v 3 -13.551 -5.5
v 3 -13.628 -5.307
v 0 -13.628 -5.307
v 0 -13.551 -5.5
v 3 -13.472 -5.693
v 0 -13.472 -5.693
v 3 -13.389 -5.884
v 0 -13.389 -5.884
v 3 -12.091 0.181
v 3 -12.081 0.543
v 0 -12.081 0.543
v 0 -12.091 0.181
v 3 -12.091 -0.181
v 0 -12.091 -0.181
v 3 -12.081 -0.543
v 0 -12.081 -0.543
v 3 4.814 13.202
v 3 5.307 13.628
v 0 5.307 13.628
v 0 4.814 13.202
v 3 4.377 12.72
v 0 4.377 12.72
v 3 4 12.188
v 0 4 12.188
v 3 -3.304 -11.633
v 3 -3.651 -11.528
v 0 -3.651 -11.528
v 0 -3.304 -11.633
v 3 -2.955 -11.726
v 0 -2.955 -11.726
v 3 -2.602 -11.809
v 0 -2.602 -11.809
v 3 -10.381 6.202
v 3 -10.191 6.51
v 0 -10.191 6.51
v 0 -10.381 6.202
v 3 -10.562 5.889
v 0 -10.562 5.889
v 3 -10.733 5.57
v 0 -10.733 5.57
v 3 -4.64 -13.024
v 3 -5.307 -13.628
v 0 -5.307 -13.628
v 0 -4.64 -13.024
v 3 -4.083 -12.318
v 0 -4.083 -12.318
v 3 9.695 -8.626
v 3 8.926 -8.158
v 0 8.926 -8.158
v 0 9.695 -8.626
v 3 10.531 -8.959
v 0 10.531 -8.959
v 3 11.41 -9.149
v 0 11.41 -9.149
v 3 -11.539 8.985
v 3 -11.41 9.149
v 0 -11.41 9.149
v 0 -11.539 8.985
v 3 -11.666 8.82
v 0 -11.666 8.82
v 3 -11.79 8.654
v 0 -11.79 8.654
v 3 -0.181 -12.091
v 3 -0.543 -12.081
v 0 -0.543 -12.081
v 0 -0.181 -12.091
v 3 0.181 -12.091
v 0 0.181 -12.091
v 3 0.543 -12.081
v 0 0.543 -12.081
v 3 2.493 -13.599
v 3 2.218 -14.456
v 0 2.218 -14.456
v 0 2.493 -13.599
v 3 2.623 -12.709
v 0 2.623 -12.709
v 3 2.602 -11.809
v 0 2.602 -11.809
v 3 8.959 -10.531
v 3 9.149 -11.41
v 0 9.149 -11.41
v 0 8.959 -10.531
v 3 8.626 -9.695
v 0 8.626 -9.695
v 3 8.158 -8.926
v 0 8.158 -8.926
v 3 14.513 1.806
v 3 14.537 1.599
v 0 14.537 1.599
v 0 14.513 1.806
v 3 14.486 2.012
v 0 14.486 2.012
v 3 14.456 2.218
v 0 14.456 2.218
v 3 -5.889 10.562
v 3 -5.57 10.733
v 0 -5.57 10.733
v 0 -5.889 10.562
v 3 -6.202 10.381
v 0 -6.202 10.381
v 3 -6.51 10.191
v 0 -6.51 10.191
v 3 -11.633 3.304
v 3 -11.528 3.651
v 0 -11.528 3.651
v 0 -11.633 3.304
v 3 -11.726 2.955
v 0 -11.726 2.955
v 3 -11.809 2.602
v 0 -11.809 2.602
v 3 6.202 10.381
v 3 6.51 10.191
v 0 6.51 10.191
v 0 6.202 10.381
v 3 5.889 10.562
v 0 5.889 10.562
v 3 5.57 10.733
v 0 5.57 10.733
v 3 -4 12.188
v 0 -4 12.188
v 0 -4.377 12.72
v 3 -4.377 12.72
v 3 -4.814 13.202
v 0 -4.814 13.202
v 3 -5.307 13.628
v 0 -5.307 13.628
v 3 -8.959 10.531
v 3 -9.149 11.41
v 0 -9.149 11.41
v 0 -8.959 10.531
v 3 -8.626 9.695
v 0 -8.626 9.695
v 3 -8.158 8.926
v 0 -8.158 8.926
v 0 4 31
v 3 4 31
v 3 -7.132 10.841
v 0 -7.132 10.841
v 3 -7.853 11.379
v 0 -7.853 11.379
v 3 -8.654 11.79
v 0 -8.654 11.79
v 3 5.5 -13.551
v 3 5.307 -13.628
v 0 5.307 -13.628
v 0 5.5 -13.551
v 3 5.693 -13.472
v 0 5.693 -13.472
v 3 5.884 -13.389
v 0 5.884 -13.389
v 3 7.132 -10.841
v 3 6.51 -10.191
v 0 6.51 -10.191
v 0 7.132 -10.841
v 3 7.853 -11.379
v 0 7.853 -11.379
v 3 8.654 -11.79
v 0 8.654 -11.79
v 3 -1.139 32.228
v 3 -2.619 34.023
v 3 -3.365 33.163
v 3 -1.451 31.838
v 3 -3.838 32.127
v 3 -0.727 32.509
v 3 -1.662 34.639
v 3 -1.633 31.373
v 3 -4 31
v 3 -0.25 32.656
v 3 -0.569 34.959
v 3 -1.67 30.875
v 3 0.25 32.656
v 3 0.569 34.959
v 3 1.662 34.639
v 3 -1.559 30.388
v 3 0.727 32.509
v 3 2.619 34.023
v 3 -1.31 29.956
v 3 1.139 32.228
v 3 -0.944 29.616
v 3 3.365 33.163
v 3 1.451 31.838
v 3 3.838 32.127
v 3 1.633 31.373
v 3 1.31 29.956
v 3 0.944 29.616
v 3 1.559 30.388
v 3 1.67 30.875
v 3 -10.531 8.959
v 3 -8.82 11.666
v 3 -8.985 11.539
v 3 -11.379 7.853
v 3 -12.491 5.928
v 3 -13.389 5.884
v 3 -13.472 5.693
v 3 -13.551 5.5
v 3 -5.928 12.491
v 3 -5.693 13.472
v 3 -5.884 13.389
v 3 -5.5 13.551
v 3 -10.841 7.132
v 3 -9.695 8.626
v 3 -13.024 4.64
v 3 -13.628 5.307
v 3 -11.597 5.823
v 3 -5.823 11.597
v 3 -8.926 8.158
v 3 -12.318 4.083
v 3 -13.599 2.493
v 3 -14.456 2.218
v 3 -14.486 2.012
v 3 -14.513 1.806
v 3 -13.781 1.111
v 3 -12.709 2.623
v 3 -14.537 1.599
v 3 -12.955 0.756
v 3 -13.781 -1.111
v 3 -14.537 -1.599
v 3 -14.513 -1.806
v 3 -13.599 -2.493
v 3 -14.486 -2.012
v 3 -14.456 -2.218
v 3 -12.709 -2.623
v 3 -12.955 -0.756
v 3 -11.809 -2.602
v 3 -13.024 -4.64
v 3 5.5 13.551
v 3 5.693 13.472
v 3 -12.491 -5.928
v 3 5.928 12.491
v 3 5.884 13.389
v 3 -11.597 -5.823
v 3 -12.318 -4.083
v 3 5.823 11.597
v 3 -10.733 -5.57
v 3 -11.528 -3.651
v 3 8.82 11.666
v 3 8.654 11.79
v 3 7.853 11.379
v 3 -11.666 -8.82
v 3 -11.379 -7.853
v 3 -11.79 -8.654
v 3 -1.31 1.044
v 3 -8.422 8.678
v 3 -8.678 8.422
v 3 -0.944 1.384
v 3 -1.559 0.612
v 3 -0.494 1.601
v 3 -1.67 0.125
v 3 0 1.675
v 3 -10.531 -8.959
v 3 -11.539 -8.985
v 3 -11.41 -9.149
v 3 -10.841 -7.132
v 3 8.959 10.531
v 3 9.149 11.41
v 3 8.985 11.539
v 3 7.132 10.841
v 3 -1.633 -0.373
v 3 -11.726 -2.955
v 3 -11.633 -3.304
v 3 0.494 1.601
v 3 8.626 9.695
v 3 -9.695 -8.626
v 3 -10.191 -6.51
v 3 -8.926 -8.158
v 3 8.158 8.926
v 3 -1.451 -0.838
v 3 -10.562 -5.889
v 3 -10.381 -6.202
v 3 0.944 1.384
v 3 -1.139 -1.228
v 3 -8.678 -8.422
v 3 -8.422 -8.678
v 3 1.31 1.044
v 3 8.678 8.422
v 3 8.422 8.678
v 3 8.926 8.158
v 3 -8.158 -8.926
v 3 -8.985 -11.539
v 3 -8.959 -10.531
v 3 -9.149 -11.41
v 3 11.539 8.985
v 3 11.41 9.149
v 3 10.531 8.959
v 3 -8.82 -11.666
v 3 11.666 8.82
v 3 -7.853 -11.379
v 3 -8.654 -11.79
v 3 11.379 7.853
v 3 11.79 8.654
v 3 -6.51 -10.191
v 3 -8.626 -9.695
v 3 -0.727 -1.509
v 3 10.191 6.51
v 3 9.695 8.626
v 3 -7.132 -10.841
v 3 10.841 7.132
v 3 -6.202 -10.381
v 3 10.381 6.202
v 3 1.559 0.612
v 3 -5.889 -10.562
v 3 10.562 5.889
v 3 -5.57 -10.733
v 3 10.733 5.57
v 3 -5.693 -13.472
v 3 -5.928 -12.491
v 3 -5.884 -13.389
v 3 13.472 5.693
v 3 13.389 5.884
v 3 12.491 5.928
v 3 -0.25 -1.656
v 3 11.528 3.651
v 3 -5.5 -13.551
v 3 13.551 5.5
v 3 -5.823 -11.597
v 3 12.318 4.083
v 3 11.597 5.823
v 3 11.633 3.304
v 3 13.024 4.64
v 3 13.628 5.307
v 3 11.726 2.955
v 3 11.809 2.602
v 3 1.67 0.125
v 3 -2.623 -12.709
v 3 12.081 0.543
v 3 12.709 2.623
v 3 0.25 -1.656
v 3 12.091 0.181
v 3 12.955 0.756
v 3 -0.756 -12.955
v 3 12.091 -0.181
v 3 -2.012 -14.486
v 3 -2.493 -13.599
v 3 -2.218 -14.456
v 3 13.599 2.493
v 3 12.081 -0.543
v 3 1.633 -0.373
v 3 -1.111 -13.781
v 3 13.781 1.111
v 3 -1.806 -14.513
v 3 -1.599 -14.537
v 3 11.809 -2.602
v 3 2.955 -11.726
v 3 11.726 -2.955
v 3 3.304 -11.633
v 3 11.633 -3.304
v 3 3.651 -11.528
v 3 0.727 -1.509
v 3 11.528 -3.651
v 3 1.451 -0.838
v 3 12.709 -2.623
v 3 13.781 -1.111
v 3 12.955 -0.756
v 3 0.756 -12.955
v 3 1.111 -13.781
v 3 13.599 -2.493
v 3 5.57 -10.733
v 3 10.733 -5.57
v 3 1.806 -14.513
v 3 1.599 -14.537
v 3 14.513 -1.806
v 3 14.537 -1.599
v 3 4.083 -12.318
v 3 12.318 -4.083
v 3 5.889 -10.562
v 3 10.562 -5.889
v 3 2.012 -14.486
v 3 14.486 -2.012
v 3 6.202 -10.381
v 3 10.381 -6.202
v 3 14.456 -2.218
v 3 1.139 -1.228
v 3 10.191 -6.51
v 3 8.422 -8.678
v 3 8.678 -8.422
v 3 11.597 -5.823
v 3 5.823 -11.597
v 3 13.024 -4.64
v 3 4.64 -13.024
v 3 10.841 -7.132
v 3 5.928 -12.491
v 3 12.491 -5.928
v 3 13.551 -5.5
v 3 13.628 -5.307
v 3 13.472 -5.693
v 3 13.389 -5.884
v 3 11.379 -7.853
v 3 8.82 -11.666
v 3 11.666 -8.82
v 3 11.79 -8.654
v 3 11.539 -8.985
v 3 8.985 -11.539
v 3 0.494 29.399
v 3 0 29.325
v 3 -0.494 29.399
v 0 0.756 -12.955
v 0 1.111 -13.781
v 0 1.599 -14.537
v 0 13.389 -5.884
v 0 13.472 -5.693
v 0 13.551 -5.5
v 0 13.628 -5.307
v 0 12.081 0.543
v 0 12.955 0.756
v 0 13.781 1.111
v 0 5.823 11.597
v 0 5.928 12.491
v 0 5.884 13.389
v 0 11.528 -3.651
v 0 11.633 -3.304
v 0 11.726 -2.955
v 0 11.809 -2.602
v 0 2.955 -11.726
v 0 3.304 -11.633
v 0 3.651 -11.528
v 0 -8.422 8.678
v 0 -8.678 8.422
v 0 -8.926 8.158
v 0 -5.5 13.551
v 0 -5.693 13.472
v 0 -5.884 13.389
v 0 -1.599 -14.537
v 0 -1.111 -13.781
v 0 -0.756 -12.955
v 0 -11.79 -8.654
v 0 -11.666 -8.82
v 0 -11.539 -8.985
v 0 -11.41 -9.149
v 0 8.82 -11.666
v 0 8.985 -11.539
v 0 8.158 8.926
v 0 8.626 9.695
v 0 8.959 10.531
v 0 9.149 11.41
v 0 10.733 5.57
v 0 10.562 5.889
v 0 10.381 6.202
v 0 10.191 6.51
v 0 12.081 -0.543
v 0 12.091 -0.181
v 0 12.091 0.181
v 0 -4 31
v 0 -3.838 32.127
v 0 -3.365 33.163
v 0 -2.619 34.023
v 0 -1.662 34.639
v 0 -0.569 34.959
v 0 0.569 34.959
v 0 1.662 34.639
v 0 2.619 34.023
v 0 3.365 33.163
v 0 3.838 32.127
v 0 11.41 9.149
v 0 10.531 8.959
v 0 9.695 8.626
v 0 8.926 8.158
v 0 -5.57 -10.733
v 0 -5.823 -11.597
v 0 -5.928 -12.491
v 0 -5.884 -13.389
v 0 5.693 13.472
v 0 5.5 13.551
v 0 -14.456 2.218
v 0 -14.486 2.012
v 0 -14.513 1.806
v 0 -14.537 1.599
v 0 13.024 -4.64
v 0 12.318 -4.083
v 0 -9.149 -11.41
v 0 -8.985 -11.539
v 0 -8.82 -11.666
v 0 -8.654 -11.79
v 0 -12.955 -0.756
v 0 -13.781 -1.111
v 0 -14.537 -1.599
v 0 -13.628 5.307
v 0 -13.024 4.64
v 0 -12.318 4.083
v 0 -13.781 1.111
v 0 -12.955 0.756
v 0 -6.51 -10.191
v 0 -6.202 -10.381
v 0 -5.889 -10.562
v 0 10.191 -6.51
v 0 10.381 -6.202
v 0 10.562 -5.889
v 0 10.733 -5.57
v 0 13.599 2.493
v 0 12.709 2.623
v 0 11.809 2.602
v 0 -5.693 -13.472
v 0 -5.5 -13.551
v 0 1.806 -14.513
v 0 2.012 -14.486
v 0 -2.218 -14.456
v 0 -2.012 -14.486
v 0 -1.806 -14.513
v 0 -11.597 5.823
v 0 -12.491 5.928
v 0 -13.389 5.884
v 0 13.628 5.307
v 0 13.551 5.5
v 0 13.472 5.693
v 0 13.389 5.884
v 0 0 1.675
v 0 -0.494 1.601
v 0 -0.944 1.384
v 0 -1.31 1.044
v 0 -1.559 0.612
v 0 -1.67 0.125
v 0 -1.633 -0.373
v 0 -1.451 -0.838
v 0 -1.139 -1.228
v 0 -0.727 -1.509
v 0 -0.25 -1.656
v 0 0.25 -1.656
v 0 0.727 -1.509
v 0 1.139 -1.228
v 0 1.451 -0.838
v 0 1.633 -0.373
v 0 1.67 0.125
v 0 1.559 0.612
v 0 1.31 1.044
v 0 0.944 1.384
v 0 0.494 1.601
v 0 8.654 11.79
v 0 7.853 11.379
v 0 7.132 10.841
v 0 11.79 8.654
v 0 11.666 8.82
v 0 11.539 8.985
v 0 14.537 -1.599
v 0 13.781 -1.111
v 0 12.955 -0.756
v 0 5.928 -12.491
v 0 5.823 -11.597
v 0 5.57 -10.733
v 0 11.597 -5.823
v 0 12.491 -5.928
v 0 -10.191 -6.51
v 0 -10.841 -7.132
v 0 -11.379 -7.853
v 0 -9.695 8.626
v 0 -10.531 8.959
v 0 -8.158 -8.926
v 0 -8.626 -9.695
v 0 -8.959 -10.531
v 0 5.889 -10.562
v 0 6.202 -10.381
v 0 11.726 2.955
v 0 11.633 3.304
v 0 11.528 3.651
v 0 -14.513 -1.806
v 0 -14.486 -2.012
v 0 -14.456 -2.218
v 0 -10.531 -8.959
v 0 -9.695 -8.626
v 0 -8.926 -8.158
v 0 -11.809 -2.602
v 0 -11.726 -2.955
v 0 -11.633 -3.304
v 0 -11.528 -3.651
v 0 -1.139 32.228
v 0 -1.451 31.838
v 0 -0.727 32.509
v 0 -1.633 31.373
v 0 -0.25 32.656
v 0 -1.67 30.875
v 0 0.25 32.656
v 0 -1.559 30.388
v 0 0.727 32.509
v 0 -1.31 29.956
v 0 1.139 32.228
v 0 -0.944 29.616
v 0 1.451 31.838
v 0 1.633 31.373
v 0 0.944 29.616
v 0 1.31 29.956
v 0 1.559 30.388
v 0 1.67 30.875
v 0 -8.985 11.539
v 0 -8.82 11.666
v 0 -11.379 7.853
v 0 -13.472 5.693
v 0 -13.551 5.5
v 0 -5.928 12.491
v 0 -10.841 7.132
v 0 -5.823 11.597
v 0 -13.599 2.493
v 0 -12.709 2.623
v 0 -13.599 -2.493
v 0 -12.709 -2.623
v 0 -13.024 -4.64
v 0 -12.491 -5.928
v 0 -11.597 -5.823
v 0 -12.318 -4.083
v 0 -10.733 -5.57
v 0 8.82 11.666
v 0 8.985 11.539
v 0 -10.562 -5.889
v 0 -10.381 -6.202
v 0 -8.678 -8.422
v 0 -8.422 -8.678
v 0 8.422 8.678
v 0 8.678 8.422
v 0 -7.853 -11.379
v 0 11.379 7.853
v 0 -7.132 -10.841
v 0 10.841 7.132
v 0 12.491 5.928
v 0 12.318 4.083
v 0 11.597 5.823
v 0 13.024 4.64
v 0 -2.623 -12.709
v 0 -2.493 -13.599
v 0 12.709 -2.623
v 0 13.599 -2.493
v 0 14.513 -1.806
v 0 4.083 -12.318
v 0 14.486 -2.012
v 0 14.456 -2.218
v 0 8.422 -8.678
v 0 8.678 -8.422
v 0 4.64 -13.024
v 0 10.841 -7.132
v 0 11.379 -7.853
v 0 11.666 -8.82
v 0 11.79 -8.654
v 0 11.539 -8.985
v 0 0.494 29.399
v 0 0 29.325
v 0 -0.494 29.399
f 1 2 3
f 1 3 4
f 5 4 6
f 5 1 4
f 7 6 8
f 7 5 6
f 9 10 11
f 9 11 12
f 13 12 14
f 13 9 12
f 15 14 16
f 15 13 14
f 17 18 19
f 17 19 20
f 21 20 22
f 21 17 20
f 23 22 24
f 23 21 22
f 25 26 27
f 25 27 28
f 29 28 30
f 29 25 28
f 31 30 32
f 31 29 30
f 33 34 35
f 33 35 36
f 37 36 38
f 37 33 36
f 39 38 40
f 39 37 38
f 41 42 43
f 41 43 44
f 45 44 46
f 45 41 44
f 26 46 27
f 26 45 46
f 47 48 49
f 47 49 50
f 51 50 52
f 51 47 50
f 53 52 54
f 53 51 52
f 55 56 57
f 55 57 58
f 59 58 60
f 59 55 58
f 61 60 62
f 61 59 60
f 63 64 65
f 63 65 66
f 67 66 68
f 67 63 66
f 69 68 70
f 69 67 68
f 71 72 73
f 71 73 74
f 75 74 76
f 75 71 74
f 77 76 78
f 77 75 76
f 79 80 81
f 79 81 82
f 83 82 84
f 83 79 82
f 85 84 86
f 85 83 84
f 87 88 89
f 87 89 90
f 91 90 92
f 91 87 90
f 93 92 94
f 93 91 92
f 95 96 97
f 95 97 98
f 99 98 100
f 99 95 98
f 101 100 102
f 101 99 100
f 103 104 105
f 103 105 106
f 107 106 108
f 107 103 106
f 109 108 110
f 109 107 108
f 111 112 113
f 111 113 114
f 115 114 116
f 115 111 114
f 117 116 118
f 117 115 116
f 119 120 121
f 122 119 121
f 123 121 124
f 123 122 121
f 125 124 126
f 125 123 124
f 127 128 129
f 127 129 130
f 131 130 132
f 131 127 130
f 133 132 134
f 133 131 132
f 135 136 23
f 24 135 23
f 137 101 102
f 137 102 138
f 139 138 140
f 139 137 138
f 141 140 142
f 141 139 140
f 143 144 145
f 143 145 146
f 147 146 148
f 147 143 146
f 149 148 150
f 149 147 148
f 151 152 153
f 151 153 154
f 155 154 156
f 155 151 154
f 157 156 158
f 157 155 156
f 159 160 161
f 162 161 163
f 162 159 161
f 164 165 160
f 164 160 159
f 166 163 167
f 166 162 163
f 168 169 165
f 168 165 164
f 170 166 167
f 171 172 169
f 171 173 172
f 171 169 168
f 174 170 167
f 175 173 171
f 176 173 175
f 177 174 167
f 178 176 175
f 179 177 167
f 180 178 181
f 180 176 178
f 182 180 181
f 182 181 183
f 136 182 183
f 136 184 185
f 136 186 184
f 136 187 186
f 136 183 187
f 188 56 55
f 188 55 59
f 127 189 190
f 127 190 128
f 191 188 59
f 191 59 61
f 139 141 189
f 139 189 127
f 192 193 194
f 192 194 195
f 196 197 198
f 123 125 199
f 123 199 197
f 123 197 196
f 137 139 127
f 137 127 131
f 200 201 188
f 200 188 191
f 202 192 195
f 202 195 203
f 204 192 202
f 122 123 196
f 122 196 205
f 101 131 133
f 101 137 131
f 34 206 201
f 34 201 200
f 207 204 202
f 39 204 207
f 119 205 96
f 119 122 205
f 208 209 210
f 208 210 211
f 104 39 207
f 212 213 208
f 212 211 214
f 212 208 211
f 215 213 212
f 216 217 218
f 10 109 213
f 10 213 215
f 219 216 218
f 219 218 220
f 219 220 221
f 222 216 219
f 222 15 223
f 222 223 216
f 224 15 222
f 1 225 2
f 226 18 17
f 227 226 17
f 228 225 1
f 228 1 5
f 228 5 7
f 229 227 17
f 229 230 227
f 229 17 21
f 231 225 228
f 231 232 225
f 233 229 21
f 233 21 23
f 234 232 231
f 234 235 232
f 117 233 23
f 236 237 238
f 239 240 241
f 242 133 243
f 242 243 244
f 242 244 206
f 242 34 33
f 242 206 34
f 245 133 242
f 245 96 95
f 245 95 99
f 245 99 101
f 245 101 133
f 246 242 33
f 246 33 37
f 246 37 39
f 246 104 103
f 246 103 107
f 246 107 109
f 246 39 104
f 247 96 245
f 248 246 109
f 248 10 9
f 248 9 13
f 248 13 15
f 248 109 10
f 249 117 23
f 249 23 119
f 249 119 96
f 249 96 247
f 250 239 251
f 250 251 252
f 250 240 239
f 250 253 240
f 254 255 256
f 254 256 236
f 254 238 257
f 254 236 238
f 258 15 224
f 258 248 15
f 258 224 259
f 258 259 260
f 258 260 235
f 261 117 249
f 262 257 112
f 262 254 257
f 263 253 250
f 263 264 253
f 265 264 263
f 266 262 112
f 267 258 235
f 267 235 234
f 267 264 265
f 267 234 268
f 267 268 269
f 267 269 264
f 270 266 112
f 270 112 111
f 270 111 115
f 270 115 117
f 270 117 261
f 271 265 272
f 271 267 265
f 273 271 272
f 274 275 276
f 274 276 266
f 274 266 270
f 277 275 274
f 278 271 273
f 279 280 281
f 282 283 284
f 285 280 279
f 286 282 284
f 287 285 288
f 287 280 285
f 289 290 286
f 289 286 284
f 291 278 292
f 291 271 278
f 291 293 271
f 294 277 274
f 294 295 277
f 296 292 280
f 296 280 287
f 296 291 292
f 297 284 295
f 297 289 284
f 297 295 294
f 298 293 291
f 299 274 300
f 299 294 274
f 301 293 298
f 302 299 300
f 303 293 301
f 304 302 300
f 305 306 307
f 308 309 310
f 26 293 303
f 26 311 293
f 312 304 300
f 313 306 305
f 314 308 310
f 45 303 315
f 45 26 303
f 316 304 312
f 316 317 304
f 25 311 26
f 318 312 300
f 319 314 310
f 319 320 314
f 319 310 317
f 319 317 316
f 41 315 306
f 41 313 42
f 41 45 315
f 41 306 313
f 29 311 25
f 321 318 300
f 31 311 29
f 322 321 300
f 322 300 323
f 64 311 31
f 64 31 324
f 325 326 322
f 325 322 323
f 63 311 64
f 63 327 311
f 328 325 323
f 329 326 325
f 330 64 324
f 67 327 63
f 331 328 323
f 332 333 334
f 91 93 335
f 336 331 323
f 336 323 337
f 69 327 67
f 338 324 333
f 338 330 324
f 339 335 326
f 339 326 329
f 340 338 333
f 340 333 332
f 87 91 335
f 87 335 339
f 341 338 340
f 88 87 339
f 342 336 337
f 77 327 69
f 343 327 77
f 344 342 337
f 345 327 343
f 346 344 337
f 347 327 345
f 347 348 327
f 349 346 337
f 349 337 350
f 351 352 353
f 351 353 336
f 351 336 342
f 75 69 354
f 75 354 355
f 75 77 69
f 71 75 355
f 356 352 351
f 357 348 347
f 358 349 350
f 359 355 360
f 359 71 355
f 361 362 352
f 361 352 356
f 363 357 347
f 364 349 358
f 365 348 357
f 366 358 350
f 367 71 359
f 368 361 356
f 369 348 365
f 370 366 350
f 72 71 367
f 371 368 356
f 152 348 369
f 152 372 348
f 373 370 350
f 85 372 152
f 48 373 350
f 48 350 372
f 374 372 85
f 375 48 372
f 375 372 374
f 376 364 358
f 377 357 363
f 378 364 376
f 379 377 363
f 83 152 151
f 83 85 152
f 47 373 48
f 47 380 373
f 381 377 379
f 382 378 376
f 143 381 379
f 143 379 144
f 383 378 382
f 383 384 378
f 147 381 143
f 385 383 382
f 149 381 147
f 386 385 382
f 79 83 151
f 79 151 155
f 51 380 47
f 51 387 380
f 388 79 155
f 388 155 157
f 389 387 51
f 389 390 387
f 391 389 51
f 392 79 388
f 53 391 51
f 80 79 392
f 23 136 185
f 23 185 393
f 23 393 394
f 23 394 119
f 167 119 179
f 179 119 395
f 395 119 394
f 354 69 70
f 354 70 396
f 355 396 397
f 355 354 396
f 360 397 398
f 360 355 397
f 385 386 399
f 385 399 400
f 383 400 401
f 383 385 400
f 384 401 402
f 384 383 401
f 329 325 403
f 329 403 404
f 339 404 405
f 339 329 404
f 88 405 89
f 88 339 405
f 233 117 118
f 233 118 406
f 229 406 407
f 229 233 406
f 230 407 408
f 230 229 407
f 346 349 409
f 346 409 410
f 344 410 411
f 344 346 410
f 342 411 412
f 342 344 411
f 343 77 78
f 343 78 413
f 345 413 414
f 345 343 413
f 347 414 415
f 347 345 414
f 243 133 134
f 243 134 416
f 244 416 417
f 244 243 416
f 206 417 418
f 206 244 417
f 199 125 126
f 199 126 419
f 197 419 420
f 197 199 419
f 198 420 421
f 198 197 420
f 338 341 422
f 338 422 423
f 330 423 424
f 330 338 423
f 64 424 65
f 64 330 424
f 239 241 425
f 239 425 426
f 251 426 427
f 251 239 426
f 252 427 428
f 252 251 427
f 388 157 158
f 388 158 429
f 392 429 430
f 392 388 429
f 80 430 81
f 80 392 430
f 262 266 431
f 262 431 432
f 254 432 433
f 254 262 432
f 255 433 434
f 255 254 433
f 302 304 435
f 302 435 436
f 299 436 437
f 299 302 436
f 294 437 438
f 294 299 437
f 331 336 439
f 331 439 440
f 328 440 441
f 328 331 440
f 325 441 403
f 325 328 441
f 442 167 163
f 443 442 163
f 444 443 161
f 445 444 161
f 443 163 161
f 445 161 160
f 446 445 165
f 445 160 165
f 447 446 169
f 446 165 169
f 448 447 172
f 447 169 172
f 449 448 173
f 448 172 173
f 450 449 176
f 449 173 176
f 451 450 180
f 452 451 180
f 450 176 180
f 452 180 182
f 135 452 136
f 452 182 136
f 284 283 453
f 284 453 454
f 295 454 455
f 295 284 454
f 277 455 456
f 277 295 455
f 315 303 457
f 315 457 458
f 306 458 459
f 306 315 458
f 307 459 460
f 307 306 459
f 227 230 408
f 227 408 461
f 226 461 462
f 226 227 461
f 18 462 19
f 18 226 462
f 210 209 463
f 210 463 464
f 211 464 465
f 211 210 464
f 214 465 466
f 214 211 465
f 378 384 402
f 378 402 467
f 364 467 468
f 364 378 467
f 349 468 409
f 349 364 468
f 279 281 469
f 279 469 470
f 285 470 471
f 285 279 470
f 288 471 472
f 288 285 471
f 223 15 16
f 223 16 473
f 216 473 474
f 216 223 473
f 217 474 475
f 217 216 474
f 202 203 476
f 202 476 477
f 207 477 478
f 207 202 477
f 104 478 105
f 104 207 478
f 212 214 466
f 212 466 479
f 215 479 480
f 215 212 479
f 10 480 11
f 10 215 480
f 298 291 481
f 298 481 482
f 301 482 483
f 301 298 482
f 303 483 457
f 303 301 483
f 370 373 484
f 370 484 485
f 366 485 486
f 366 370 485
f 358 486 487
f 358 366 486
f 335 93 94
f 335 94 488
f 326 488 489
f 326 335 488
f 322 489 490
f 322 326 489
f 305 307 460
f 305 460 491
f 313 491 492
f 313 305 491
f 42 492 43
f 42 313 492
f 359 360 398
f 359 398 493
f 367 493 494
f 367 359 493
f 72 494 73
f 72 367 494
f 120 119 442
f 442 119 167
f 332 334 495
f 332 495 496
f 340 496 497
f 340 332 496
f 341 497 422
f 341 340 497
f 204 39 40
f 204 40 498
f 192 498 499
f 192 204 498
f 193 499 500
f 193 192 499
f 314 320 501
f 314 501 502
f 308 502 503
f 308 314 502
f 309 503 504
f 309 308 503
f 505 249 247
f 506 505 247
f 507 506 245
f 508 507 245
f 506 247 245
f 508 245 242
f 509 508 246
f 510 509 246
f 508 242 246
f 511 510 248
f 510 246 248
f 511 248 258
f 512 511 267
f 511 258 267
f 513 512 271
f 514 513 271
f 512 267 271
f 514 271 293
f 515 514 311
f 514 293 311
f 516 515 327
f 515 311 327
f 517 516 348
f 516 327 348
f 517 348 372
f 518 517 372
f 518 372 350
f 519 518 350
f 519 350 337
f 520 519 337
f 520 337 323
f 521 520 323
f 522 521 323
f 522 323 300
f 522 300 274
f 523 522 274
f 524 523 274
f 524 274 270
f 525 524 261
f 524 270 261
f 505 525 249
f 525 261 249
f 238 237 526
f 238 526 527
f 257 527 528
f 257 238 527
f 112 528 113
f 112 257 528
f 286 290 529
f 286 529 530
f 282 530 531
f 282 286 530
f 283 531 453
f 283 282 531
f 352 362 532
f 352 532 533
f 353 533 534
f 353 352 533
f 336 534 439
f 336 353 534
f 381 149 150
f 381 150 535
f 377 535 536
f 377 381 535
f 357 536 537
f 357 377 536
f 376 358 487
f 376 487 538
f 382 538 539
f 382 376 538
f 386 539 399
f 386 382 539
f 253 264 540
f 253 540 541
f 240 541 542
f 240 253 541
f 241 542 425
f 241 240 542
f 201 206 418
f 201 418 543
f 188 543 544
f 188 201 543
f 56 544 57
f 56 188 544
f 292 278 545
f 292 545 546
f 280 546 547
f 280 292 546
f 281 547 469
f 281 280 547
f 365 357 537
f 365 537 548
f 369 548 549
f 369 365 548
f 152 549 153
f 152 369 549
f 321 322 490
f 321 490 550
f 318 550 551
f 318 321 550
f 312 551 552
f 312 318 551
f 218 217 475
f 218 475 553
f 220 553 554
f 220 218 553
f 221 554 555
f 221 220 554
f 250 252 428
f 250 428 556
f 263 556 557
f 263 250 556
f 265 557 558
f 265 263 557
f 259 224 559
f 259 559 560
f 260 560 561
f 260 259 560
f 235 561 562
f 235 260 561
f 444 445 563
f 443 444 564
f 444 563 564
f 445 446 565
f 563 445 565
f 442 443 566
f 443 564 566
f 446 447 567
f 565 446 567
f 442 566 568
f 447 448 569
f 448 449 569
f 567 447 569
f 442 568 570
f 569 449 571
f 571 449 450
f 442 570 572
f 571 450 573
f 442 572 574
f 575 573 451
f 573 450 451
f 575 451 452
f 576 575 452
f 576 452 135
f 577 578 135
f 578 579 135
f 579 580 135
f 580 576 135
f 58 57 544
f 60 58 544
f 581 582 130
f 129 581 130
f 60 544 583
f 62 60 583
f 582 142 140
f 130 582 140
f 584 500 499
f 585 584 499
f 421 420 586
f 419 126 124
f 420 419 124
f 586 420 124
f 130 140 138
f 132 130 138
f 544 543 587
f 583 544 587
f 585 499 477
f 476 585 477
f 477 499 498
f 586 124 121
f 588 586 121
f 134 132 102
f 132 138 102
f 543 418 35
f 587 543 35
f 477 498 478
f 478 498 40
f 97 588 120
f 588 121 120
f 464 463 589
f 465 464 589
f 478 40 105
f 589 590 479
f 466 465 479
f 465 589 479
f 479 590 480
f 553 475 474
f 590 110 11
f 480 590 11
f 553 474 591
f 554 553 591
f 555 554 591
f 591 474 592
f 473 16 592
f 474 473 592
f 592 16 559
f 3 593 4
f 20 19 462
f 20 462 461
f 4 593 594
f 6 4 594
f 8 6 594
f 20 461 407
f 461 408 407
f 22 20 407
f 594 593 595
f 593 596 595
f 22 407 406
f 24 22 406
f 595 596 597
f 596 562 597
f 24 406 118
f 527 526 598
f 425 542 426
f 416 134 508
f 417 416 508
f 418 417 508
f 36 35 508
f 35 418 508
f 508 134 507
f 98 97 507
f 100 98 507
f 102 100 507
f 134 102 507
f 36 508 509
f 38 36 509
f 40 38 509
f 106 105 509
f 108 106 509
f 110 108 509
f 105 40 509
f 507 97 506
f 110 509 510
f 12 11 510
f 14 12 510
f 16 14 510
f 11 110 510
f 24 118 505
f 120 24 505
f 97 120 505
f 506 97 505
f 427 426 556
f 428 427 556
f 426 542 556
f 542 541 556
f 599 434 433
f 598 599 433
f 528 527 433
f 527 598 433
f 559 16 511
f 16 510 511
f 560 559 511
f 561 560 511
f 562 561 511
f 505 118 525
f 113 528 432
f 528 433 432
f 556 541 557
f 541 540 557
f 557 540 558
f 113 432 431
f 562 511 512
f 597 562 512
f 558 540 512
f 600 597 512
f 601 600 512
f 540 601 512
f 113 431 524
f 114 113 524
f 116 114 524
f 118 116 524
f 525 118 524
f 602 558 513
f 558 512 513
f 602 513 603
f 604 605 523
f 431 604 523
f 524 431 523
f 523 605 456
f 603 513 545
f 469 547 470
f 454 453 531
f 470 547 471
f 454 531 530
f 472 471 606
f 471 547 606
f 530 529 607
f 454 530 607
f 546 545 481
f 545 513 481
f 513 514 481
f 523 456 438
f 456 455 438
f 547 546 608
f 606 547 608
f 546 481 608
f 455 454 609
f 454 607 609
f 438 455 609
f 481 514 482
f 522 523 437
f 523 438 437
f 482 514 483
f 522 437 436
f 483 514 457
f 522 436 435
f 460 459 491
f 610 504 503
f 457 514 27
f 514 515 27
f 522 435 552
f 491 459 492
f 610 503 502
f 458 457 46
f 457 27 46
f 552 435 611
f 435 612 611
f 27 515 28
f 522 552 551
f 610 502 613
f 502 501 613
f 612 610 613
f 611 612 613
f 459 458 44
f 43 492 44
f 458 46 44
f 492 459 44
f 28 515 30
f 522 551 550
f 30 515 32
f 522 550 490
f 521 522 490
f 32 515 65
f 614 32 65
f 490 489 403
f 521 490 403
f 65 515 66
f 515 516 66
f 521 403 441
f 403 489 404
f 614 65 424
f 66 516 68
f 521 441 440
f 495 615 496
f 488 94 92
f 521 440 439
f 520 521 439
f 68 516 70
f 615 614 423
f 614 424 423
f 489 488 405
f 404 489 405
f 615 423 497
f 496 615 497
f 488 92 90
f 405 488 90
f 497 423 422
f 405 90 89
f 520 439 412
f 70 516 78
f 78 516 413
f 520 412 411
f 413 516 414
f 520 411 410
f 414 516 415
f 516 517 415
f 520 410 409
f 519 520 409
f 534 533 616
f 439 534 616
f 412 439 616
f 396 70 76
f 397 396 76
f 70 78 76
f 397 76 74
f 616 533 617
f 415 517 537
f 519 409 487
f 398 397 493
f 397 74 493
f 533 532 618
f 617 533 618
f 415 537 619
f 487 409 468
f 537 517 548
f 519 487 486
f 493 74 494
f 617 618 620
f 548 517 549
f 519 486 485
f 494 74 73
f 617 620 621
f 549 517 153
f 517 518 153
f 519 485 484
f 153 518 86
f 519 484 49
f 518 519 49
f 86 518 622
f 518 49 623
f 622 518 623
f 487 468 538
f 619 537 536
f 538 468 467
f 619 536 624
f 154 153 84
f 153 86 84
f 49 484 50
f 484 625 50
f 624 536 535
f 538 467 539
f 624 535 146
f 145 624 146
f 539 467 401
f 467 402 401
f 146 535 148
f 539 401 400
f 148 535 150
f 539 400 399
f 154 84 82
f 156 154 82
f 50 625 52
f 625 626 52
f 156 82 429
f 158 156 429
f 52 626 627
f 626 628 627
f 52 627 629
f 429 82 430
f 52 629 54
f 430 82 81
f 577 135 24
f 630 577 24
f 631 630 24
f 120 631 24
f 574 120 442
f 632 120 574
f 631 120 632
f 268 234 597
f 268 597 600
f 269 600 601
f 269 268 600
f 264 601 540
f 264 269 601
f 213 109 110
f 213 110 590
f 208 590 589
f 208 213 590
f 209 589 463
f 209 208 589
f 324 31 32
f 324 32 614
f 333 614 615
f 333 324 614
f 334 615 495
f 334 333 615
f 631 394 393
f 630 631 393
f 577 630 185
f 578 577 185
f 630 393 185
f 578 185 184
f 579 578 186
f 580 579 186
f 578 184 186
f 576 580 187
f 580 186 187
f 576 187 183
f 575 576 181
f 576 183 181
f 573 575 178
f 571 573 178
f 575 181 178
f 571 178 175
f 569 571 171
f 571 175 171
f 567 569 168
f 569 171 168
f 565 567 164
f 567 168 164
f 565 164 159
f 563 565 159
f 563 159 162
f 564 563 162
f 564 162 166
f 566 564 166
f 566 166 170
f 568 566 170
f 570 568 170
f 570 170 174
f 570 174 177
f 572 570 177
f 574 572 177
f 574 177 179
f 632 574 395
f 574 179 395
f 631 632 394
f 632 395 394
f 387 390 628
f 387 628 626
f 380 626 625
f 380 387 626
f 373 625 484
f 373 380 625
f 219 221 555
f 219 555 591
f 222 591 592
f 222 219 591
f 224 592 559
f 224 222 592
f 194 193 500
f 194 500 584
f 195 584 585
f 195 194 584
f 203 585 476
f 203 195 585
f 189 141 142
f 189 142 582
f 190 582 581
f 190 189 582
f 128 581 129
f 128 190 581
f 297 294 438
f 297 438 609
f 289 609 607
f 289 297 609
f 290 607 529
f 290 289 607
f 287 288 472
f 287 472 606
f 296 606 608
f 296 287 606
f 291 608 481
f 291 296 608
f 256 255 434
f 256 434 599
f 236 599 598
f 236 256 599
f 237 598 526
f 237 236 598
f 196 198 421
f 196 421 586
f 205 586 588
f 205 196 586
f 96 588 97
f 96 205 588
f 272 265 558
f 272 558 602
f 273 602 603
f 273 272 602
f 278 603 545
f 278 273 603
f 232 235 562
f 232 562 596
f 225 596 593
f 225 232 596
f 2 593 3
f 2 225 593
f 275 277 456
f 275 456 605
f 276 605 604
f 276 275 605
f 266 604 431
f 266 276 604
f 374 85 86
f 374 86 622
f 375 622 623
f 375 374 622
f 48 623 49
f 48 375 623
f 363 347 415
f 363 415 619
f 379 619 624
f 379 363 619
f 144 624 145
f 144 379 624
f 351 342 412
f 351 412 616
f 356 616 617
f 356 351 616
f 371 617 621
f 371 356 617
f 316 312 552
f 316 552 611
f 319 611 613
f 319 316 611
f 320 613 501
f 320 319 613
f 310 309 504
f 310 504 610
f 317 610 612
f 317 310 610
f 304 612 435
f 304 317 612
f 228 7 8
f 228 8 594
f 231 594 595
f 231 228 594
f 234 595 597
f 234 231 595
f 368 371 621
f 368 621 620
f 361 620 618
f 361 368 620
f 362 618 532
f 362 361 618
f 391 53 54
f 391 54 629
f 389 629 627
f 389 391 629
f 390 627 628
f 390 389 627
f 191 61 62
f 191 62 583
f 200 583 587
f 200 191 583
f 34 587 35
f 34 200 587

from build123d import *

# Parameters (mm, degrees)
SKETCH1_R           = 1.675
BOSS_EXTRUDE1_DEPTH = 3
SKETCH2_R           = 1.675
BOSS_EXTRUDE2_DEPTH = 3


with BuildPart() as part:
    # Sketch1 → Boss-Extrude1 (new body)
    with BuildSketch(Plane(origin=(3, 0, 0), x_dir=(0, 0, -1), z_dir=(1, 0, 0))):
        with BuildLine():
            ThreePointArc((-14.537314892, 1.599093719), (-13.375367565, 0.916420874), (-12.080565177, 0.542722358))
            ThreePointArc((-12.080565177, 0.542722358), (-12.09275, 0), (-12.080565177, -0.542722358))
            ThreePointArc((-12.080565177, -0.542722358), (-13.375367565, -0.916420874), (-14.537314892, -1.599093719))
            ThreePointArc((-14.537314892, -1.599093719), (-14.499881098, -1.908945561), (-14.455843809, -2.217928037))
            ThreePointArc((-14.455843809, -2.217928037), (-13.156800143, -2.576605271), (-11.809396783, -2.602450802))
            ThreePointArc((-11.809396783, -2.602450802), (-11.680699536, -3.129834008), (-11.528463019, -3.650909885))
            ThreePointArc((-11.528463019, -3.650909885), (-12.682425791, -4.346994451), (-13.62809199, -5.30713988))
            ThreePointArc((-13.62809199, -5.30713988), (-13.511738163, -5.596745198), (-13.389230859, -5.883801663))
            ThreePointArc((-13.389230859, -5.883801663), (-12.041618533, -5.894040025), (-10.733437515, -5.57027124))
            ThreePointArc((-10.733437515, -5.57027124), (-10.472628702, -6.046375), (-10.190715157, -6.510293938))
            ThreePointArc((-10.190715157, -6.510293938), (-11.125197659, -7.48132754), (-11.79013714, -8.65351323))
            ThreePointArc((-11.79013714, -8.65351323), (-11.602792602, -8.903135899), (-11.410163953, -9.148703928))
            ThreePointArc((-11.410163953, -9.148703928), (-10.105820521, -8.809805691), (-8.926012217, -8.158486898))
            ThreePointArc((-8.926012217, -8.158486898), (-8.550865528, -8.550865528), (-8.158486898, -8.926012217))
            ThreePointArc((-8.158486898, -8.926012217), (-8.809805691, -10.105820521), (-9.148703928, -11.410163953))
            ThreePointArc((-9.148703928, -11.410163953), (-8.903135899, -11.602792602), (-8.65351323, -11.79013714))
            ThreePointArc((-8.65351323, -11.79013714), (-7.48132754, -11.125197659), (-6.510293938, -10.190715157))
            ThreePointArc((-6.510293938, -10.190715157), (-6.046375, -10.472628702), (-5.57027124, -10.733437515))
            ThreePointArc((-5.57027124, -10.733437515), (-5.894040025, -12.041618533), (-5.883801663, -13.389230859))
            ThreePointArc((-5.883801663, -13.389230859), (-5.596745198, -13.511738163), (-5.30713988, -13.62809199))
            ThreePointArc((-5.30713988, -13.62809199), (-4.346994451, -12.682425791), (-3.650909885, -11.528463019))
            ThreePointArc((-3.650909885, -11.528463019), (-3.129834008, -11.680699536), (-2.602450802, -11.809396783))
            ThreePointArc((-2.602450802, -11.809396783), (-2.576605271, -13.156800143), (-2.217928037, -14.455843809))
            ThreePointArc((-2.217928037, -14.455843809), (-1.908945561, -14.499881098), (-1.599093719, -14.537314892))
            ThreePointArc((-1.599093719, -14.537314892), (-0.916420874, -13.375367565), (-0.542722358, -12.080565177))
            ThreePointArc((-0.542722358, -12.080565177), (0, -12.09275), (0.542722358, -12.080565177))
            ThreePointArc((0.542722358, -12.080565177), (0.916420874, -13.375367565), (1.599093719, -14.537314892))
            ThreePointArc((1.599093719, -14.537314892), (1.908945561, -14.499881098), (2.217928037, -14.455843809))
            ThreePointArc((2.217928037, -14.455843809), (2.576605271, -13.156800143), (2.602450802, -11.809396783))
            ThreePointArc((2.602450802, -11.809396783), (3.129834008, -11.680699536), (3.650909885, -11.528463019))
            ThreePointArc((3.650909885, -11.528463019), (4.346994451, -12.682425791), (5.30713988, -13.62809199))
            ThreePointArc((5.30713988, -13.62809199), (5.596745198, -13.511738163), (5.883801663, -13.389230859))
            ThreePointArc((5.883801663, -13.389230859), (5.894040025, -12.041618533), (5.57027124, -10.733437515))
            ThreePointArc((5.57027124, -10.733437515), (6.046375, -10.472628702), (6.510293938, -10.190715157))
            ThreePointArc((6.510293938, -10.190715157), (7.48132754, -11.125197659), (8.65351323, -11.79013714))
            ThreePointArc((8.65351323, -11.79013714), (8.903135899, -11.602792602), (9.148703928, -11.410163953))
            ThreePointArc((9.148703928, -11.410163953), (8.809805691, -10.105820521), (8.158486898, -8.926012217))
            ThreePointArc((8.158486898, -8.926012217), (8.550865528, -8.550865528), (8.926012217, -8.158486898))
            ThreePointArc((8.926012217, -8.158486898), (10.105820521, -8.809805691), (11.410163953, -9.148703928))
            ThreePointArc((11.410163953, -9.148703928), (11.602792602, -8.903135899), (11.79013714, -8.65351323))
            ThreePointArc((11.79013714, -8.65351323), (11.125197659, -7.48132754), (10.190715157, -6.510293938))
            ThreePointArc((10.190715157, -6.510293938), (10.472628702, -6.046375), (10.733437515, -5.57027124))
            ThreePointArc((10.733437515, -5.57027124), (12.041618533, -5.894040025), (13.389230859, -5.883801663))
            ThreePointArc((13.389230859, -5.883801663), (13.511738163, -5.596745198), (13.62809199, -5.30713988))
            ThreePointArc((13.62809199, -5.30713988), (12.682425791, -4.346994451), (11.528463019, -3.650909885))
            ThreePointArc((11.528463019, -3.650909885), (11.680699536, -3.129834008), (11.809396783, -2.602450802))
            ThreePointArc((11.809396783, -2.602450802), (13.156800143, -2.576605271), (14.455843809, -2.217928037))
            ThreePointArc((14.455843809, -2.217928037), (14.499881098, -1.908945561), (14.537314892, -1.599093719))
            ThreePointArc((14.537314892, -1.599093719), (13.375367565, -0.916420874), (12.080565177, -0.542722358))
            ThreePointArc((12.080565177, -0.542722358), (12.09275, 0), (12.080565177, 0.542722358))
            ThreePointArc((12.080565177, 0.542722358), (13.375367565, 0.916420874), (14.537314892, 1.599093719))
            ThreePointArc((14.537314892, 1.599093719), (14.499881098, 1.908945561), (14.455843809, 2.217928037))
            ThreePointArc((14.455843809, 2.217928037), (13.156800143, 2.576605271), (11.809396783, 2.602450802))
            ThreePointArc((11.809396783, 2.602450802), (11.680699536, 3.129834008), (11.528463019, 3.650909885))
            ThreePointArc((11.528463019, 3.650909885), (12.682425791, 4.346994451), (13.62809199, 5.30713988))
            ThreePointArc((13.62809199, 5.30713988), (13.511738163, 5.596745198), (13.389230859, 5.883801663))
            ThreePointArc((13.389230859, 5.883801663), (12.041618533, 5.894040025), (10.733437515, 5.57027124))
            ThreePointArc((10.733437515, 5.57027124), (10.472628702, 6.046375), (10.190715157, 6.510293938))
            ThreePointArc((10.190715157, 6.510293938), (11.125197659, 7.48132754), (11.79013714, 8.65351323))
            ThreePointArc((11.79013714, 8.65351323), (11.602792602, 8.903135899), (11.410163953, 9.148703928))
            ThreePointArc((11.410163953, 9.148703928), (10.105820521, 8.809805691), (8.926012217, 8.158486898))
            ThreePointArc((8.926012217, 8.158486898), (8.550865528, 8.550865528), (8.158486898, 8.926012217))
            ThreePointArc((8.158486898, 8.926012217), (8.809805691, 10.105820521), (9.148703928, 11.410163953))
            ThreePointArc((9.148703928, 11.410163953), (8.903135899, 11.602792602), (8.65351323, 11.79013714))
            ThreePointArc((8.65351323, 11.79013714), (7.48132754, 11.125197659), (6.510293938, 10.190715157))
            ThreePointArc((6.510293938, 10.190715157), (6.046375, 10.472628702), (5.57027124, 10.733437515))
            ThreePointArc((5.57027124, 10.733437515), (5.894040025, 12.041618533), (5.883801663, 13.389230859))
            ThreePointArc((5.883801663, 13.389230859), (5.596745198, 13.511738163), (5.30713988, 13.62809199))
            ThreePointArc((5.30713988, 13.62809199), (4.346994451, 12.682425791), (3.650909885, 11.528463019))
            ThreePointArc((3.650909885, 11.528463019), (3.129834008, 11.680699536), (2.602450802, 11.809396783))
            ThreePointArc((2.602450802, 11.809396783), (2.576605271, 13.156800143), (2.217928037, 14.455843809))
            ThreePointArc((2.217928037, 14.455843809), (1.908945561, 14.499881098), (1.599093719, 14.537314892))
            ThreePointArc((1.599093719, 14.537314892), (0.916420874, 13.375367565), (0.542722358, 12.080565177))
            ThreePointArc((0.542722358, 12.080565177), (0, 12.09275), (-0.542722358, 12.080565177))
            ThreePointArc((-0.542722358, 12.080565177), (-0.916420874, 13.375367565), (-1.599093719, 14.537314892))
            ThreePointArc((-1.599093719, 14.537314892), (-1.908945561, 14.499881098), (-2.217928037, 14.455843809))
            ThreePointArc((-2.217928037, 14.455843809), (-2.576605271, 13.156800143), (-2.602450802, 11.809396783))
            ThreePointArc((-2.602450802, 11.809396783), (-3.129834008, 11.680699536), (-3.650909885, 11.528463019))
            ThreePointArc((-3.650909885, 11.528463019), (-4.346994451, 12.682425791), (-5.30713988, 13.62809199))
            ThreePointArc((-5.30713988, 13.62809199), (-5.596745198, 13.511738163), (-5.883801663, 13.389230859))
            ThreePointArc((-5.883801663, 13.389230859), (-5.894040025, 12.041618533), (-5.57027124, 10.733437515))
            ThreePointArc((-5.57027124, 10.733437515), (-6.046375, 10.472628702), (-6.510293938, 10.190715157))
            ThreePointArc((-6.510293938, 10.190715157), (-7.48132754, 11.125197659), (-8.65351323, 11.79013714))
            ThreePointArc((-8.65351323, 11.79013714), (-8.903135899, 11.602792602), (-9.148703928, 11.410163953))
            ThreePointArc((-9.148703928, 11.410163953), (-8.809805691, 10.105820521), (-8.158486898, 8.926012217))
            ThreePointArc((-8.158486898, 8.926012217), (-8.550865528, 8.550865528), (-8.926012217, 8.158486898))
            ThreePointArc((-8.926012217, 8.158486898), (-10.105820521, 8.809805691), (-11.410163953, 9.148703928))
            ThreePointArc((-11.410163953, 9.148703928), (-11.602792602, 8.903135899), (-11.79013714, 8.65351323))
            ThreePointArc((-11.79013714, 8.65351323), (-11.125197659, 7.48132754), (-10.190715157, 6.510293938))
            ThreePointArc((-10.190715157, 6.510293938), (-10.472628702, 6.046375), (-10.733437515, 5.57027124))
            ThreePointArc((-10.733437515, 5.57027124), (-12.041618533, 5.894040025), (-13.389230859, 5.883801663))
            ThreePointArc((-13.389230859, 5.883801663), (-13.511738163, 5.596745198), (-13.62809199, 5.30713988))
            ThreePointArc((-13.62809199, 5.30713988), (-12.682425791, 4.346994451), (-11.528463019, 3.650909885))
            ThreePointArc((-11.528463019, 3.650909885), (-11.680699536, 3.129834008), (-11.809396783, 2.602450802))
            ThreePointArc((-11.809396783, 2.602450802), (-13.156800143, 2.576605271), (-14.455843809, 2.217928037))
            ThreePointArc((-14.455843809, 2.217928037), (-14.499881098, 1.908945561), (-14.537314892, 1.599093719))
        make_face()
        with Locations(Location((0, 0, 0), (0, 0, 180))):
            Circle(SKETCH1_R, mode=Mode.SUBTRACT)
    extrude(amount=-BOSS_EXTRUDE1_DEPTH)

    # Sketch2 → Boss-Extrude2 (add)
    with BuildSketch(Plane(origin=(3, 0, 0), x_dir=(0, 0, -1), z_dir=(1, 0, 0))):
        with BuildLine():
            Line((0, -4), (-31, -4))
            ThreePointArc((-31, -4), (-35, 0), (-31, 4))
            Line((-31, 4), (0, 4))
            ThreePointArc((0, 4), (4, 0), (0, -4))
        make_face()
        with Locations((-31, 0)):
            Circle(SKETCH2_R, mode=Mode.SUBTRACT)
        with Locations(Location((0, 0, 0), (0, 0, 180))):
            Circle(SKETCH2_R, mode=Mode.SUBTRACT)
    extrude(amount=-BOSS_EXTRUDE2_DEPTH)


solid = part.part
